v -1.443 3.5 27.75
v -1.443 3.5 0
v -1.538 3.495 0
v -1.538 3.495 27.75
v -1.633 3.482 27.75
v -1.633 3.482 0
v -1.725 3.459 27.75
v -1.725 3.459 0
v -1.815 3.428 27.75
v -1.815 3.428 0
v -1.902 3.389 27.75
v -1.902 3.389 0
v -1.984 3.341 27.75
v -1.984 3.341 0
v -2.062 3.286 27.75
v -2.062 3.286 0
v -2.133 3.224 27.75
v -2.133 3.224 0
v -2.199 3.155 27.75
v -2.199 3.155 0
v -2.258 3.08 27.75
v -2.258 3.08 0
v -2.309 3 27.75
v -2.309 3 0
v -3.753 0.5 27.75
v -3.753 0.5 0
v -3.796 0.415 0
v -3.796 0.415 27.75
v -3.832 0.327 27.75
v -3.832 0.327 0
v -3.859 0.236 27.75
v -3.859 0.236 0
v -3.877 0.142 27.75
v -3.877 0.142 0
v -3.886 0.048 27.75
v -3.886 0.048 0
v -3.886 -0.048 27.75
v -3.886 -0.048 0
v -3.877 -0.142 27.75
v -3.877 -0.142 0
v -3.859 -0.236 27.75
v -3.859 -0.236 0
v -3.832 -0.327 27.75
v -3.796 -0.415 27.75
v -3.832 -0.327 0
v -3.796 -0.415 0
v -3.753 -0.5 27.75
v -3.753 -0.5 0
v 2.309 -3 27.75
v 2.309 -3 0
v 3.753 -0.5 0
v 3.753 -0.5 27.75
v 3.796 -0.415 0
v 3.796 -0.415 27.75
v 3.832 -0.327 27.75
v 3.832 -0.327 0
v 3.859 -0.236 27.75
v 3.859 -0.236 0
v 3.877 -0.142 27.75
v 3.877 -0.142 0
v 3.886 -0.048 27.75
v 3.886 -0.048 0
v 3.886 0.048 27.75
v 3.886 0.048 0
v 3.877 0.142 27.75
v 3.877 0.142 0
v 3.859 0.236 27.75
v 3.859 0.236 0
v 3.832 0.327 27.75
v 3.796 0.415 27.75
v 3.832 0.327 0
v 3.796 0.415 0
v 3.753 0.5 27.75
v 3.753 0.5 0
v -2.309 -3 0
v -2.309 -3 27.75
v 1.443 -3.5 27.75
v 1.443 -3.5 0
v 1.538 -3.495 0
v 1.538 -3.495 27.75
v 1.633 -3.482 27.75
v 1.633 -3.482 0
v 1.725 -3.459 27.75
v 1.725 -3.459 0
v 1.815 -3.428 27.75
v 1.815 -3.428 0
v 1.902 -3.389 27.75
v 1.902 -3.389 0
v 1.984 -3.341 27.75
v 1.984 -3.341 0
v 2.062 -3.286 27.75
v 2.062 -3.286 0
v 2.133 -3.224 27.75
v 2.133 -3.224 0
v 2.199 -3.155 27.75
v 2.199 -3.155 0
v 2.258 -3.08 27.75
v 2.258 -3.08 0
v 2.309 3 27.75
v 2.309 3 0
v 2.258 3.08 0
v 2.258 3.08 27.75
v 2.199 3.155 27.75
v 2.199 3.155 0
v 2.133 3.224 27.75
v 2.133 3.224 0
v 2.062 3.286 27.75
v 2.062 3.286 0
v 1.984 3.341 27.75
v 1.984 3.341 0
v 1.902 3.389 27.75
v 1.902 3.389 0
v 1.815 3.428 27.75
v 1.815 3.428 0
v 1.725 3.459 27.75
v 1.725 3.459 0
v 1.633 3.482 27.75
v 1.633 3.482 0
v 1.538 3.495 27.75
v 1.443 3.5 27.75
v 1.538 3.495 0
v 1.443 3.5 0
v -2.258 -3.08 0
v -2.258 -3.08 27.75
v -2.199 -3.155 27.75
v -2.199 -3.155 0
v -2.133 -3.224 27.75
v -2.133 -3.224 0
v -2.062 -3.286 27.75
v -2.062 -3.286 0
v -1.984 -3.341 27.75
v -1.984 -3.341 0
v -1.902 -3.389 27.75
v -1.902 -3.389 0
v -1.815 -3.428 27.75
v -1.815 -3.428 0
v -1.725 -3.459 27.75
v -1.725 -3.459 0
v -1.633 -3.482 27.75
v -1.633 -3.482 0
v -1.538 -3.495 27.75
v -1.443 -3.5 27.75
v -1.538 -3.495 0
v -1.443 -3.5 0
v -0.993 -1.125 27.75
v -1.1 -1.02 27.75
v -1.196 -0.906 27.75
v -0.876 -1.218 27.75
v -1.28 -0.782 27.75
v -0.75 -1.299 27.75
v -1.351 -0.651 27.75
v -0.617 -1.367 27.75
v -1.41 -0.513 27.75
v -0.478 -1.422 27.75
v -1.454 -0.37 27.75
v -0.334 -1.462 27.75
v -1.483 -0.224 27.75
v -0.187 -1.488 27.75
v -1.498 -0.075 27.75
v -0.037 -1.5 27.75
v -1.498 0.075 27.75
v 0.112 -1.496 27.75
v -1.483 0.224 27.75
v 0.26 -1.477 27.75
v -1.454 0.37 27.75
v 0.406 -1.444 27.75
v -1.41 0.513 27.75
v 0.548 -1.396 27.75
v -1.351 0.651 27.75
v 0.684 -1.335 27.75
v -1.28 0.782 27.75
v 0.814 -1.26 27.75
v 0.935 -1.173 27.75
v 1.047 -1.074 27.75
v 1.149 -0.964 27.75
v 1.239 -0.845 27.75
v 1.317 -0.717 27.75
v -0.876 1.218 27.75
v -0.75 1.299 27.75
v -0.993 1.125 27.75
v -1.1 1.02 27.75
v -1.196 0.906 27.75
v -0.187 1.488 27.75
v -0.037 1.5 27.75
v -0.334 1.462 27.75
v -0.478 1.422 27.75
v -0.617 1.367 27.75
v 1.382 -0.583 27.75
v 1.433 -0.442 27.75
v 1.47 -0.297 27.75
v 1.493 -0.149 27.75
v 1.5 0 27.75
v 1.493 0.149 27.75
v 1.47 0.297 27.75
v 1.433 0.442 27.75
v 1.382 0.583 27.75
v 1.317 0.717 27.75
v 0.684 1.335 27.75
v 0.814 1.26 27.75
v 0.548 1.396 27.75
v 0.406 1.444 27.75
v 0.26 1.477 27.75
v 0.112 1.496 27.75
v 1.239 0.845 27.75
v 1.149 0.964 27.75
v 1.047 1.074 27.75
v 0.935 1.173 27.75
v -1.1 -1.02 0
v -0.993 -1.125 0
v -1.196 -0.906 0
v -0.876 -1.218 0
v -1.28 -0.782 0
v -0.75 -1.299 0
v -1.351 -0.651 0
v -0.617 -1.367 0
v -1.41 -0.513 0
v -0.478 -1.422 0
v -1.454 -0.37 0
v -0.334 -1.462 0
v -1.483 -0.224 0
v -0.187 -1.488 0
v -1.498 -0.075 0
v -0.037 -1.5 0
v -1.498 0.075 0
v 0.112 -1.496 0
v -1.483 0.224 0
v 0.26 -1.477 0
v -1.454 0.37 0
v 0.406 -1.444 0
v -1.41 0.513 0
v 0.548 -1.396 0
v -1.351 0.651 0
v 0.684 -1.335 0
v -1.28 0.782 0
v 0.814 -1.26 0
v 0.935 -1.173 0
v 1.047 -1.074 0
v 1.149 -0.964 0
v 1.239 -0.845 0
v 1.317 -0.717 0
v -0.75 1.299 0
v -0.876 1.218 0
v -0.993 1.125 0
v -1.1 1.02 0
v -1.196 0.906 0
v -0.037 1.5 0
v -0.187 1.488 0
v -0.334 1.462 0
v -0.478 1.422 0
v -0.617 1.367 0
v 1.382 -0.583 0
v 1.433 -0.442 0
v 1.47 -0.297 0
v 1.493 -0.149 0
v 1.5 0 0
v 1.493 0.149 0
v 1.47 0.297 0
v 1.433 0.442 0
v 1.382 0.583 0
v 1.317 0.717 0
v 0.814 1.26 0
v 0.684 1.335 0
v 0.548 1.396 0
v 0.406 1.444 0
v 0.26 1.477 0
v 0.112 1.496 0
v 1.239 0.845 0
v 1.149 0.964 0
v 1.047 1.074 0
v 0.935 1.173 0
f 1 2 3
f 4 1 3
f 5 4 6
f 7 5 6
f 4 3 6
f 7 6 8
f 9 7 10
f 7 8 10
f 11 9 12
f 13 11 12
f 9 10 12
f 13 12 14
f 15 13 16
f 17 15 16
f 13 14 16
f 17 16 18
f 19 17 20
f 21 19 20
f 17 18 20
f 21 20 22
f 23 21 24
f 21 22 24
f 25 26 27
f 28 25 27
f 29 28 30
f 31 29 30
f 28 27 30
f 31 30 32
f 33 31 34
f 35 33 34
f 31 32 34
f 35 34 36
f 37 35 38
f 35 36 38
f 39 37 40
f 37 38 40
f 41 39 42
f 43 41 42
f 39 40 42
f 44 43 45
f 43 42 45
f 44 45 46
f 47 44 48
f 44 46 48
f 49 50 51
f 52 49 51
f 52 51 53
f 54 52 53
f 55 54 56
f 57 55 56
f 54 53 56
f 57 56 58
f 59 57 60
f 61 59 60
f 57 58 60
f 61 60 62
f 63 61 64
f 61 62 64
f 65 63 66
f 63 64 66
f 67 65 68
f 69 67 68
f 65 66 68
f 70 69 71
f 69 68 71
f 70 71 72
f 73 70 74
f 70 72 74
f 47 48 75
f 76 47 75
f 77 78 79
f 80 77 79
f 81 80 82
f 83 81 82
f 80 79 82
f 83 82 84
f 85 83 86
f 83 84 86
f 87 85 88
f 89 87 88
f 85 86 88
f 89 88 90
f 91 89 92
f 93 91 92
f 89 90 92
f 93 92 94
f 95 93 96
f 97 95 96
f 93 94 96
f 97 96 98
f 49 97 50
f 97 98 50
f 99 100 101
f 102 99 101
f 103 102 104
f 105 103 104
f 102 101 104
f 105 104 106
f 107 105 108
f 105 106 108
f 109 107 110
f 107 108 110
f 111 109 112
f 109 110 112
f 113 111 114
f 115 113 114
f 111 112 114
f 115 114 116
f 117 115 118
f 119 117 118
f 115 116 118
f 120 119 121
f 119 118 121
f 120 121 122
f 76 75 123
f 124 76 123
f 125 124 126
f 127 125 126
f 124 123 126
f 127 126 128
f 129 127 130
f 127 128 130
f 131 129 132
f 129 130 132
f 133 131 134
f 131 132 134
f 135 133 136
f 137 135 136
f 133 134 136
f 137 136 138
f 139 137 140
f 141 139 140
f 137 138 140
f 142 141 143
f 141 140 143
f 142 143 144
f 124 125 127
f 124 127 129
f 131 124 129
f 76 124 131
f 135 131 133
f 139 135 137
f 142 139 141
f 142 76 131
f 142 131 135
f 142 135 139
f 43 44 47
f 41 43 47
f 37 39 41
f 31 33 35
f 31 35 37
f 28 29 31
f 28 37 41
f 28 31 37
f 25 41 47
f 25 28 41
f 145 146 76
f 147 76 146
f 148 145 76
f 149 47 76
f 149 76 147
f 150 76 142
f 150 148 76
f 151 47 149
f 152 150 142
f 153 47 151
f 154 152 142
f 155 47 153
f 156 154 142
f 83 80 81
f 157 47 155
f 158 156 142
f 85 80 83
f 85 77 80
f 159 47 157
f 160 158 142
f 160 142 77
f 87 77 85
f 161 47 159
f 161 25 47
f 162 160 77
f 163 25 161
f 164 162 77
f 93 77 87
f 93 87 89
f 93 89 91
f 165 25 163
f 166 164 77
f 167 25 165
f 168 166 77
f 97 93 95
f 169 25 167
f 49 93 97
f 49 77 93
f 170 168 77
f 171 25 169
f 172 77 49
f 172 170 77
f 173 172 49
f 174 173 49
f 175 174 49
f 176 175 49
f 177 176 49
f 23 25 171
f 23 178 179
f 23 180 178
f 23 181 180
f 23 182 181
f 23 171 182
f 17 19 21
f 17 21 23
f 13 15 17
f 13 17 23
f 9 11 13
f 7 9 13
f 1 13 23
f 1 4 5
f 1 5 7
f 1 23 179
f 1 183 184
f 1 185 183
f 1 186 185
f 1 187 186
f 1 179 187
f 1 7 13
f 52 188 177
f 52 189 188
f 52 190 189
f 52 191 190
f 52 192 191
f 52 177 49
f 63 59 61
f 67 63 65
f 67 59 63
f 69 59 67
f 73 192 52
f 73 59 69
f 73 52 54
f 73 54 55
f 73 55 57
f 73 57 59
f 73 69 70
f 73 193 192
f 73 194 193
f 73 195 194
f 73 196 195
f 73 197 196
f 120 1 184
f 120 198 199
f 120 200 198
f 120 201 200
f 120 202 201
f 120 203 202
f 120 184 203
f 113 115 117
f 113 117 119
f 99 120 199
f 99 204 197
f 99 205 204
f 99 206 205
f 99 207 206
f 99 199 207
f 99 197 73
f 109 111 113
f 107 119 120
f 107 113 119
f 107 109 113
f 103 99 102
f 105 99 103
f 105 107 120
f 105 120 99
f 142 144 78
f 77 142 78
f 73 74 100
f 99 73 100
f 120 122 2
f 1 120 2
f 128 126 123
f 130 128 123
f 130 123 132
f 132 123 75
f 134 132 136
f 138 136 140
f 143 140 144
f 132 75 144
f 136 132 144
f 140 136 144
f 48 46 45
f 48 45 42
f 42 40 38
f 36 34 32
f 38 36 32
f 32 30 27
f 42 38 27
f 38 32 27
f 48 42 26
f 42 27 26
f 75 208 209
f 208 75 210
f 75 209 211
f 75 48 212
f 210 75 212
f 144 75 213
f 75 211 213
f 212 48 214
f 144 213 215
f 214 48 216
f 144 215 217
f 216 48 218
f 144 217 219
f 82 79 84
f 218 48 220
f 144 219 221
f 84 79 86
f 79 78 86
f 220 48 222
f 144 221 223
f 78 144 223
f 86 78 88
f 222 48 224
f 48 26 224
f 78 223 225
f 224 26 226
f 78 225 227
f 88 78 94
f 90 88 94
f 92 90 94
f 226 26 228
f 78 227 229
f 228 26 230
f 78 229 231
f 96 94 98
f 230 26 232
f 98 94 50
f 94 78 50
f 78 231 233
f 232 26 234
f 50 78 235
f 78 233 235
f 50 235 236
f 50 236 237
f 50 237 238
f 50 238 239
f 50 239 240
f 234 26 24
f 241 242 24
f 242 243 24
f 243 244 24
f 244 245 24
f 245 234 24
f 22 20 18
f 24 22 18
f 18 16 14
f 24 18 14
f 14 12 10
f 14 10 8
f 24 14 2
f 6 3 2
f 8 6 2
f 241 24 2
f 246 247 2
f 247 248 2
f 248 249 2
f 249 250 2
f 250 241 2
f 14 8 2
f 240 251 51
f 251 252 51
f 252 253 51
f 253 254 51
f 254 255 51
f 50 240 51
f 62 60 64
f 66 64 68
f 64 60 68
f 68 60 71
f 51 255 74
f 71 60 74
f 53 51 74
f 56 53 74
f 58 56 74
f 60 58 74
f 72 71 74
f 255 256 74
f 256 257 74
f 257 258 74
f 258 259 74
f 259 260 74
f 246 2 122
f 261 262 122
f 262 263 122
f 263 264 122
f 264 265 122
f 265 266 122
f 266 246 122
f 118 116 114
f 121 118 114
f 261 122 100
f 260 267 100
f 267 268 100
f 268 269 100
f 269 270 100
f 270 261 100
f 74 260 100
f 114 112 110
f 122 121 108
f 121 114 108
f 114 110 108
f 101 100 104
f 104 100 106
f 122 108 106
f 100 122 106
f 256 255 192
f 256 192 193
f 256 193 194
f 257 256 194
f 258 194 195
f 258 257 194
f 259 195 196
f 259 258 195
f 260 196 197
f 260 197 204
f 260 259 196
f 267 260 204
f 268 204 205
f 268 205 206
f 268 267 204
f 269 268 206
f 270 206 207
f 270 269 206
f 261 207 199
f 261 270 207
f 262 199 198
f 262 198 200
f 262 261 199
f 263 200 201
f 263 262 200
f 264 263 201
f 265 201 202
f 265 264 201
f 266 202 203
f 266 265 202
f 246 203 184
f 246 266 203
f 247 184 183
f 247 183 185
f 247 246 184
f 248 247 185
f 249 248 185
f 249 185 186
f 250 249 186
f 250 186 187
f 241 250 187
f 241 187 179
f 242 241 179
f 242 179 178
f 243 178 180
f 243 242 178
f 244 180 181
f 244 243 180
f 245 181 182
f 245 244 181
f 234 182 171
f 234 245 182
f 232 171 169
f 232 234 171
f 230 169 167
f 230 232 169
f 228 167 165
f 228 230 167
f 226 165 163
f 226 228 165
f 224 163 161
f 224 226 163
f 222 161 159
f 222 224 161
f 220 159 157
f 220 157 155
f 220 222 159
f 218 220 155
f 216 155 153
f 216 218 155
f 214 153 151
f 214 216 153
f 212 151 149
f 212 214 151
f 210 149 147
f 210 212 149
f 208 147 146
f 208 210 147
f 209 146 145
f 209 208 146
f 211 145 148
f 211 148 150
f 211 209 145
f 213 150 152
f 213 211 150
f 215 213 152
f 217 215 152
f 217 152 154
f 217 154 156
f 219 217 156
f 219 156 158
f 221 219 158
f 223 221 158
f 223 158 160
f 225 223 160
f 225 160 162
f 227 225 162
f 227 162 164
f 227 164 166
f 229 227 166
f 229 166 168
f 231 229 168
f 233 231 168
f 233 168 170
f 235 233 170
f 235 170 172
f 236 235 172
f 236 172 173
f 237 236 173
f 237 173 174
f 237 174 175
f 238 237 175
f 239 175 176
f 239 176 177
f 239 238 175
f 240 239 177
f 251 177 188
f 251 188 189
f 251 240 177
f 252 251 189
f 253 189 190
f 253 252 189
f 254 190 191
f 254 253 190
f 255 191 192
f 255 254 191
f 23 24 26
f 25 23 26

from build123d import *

# Parameters (mm, degrees)
SKETCH_1_R      = 1.5
EXTRUDE_1_DEPTH = 27.75


with BuildPart() as part:
    # Эскиз1 → Бобышка-Вытянуть1 (new body)
    with BuildSketch(Plane.XY):
        with BuildLine():
            Line((3.75277675, 0.5), (2.309401077, 3))
            ThreePointArc((2.309401077, 3), (1.943375673, 3.366025404), (1.443375673, 3.5))
            Line((1.443375673, 3.5), (-1.443375673, 3.5))
            ThreePointArc((-1.443375673, 3.5), (-1.943375673, 3.366025404), (-2.309401077, 3))
            Line((-2.309401077, 3), (-3.75277675, 0.5))
            ThreePointArc((-3.75277675, 0.5), (-3.886751346, 0), (-3.75277675, -0.5))
            Line((-3.75277675, -0.5), (-2.309401077, -3))
            ThreePointArc((-2.309401077, -3), (-1.943375673, -3.366025404), (-1.443375673, -3.5))
            Line((-1.443375673, -3.5), (1.443375673, -3.5))
            ThreePointArc((1.443375673, -3.5), (1.943375673, -3.366025404), (2.309401077, -3))
            Line((2.309401077, -3), (3.75277675, -0.5))
            ThreePointArc((3.75277675, -0.5), (3.886751346, 0), (3.75277675, 0.5))
        make_face()
        Circle(SKETCH_1_R, mode=Mode.SUBTRACT)
    extrude(amount=EXTRUDE_1_DEPTH)


solid = part.part
